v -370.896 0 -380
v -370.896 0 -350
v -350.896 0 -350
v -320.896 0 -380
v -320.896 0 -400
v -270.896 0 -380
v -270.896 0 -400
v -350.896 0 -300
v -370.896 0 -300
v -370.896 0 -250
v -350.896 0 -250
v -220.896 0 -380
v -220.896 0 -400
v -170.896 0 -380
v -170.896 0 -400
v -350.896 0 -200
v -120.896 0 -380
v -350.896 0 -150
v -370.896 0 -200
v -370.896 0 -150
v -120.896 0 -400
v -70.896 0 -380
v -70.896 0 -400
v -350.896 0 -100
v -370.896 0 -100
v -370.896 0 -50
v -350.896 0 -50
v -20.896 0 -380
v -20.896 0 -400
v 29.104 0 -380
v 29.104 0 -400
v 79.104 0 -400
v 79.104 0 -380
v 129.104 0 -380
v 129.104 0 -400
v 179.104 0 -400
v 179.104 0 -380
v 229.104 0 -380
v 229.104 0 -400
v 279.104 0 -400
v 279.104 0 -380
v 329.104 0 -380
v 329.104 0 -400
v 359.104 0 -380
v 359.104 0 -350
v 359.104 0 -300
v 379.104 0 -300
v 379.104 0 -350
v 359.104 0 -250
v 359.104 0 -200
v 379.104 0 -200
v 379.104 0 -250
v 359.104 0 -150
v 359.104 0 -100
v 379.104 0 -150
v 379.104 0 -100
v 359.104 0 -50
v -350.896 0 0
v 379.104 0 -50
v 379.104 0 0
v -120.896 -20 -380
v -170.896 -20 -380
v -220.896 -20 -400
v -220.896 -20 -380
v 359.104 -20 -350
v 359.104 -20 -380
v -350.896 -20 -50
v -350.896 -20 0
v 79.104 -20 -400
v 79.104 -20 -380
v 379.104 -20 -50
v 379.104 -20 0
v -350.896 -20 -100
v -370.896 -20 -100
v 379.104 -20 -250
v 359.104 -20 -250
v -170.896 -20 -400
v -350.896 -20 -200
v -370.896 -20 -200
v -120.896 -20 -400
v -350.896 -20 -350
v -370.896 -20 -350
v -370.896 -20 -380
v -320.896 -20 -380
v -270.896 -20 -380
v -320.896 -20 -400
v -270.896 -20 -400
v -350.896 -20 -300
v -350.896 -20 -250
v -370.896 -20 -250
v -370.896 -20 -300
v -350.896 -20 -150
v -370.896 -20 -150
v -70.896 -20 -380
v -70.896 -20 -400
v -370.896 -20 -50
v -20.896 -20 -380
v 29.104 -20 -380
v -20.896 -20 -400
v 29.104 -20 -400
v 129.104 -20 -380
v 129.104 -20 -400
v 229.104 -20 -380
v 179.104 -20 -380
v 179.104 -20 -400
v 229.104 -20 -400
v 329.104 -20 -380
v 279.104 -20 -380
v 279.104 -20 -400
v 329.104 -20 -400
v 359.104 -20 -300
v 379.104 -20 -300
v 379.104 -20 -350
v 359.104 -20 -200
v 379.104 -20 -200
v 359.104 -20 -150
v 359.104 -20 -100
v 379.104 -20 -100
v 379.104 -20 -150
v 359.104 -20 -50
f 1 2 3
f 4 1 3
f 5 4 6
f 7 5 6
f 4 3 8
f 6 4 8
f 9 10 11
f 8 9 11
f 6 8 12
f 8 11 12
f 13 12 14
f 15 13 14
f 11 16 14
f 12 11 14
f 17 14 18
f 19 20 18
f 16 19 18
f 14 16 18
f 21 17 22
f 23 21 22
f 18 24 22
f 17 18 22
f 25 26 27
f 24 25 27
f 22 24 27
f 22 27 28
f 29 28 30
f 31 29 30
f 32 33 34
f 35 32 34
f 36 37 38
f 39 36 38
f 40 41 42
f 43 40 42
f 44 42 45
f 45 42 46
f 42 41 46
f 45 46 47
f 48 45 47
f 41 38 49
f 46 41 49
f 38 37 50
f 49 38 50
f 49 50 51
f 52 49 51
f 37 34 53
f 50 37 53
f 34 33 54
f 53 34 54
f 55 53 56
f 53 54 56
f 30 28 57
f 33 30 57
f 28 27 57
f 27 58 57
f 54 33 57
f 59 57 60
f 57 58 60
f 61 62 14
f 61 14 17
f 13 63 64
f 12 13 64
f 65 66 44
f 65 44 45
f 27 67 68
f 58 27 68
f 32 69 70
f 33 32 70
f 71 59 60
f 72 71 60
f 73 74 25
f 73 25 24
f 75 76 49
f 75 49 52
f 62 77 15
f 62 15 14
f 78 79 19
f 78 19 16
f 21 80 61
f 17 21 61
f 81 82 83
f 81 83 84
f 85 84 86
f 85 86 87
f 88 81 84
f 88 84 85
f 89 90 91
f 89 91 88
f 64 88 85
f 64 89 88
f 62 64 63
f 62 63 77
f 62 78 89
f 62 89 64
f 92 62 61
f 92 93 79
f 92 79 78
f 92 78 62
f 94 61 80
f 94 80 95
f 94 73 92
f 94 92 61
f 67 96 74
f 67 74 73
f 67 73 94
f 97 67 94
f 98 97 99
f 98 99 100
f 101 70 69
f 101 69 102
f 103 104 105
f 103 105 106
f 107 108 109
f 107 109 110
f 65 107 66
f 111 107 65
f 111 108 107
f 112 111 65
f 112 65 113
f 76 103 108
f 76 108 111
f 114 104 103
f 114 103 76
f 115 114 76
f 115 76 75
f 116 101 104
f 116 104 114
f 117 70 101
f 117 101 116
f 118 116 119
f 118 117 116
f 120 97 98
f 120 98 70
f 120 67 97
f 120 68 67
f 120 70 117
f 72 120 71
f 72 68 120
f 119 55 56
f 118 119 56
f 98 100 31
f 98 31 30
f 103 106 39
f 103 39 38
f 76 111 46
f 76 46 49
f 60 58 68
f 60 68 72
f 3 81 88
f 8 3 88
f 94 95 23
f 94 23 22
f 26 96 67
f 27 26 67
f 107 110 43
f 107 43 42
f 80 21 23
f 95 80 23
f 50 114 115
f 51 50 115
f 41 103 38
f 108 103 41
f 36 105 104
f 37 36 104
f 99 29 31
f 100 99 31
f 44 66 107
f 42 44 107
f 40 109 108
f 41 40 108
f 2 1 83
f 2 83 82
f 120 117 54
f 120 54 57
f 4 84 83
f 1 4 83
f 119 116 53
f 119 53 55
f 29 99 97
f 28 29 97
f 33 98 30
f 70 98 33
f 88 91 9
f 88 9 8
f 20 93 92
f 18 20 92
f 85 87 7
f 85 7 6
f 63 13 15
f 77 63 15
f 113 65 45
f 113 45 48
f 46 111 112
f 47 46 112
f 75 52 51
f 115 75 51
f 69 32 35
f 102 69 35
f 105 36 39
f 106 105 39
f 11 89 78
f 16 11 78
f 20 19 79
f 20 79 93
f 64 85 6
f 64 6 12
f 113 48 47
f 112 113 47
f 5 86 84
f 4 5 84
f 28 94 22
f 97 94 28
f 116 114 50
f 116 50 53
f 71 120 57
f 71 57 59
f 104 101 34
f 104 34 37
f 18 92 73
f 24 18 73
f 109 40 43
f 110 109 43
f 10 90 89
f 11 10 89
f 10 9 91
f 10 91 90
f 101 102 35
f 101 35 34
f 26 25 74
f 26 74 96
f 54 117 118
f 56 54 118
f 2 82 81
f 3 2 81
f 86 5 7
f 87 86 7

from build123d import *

# Parameters (mm, degrees)
F0_W     = 750
F0_H     = 400
F1_DEPTH = 20
F2_W     = 20
F2_H     = 50
F2_H_2   = 30
F3_DEPTH = 20
F2_H_3   = 20
F2_W_2   = 30
F2_W_3   = 50
F4_DEPTH = 20


with BuildPart() as f1:
    # F0 (on Front) → F1 (new body)
    with BuildSketch(Plane.XZ):
        with Locations((4.104346, -200)):
            Rectangle(F0_W, F0_H)
    extrude(amount=F1_DEPTH)

    # F2 (on face) → F3 (cut)
    with BuildSketch(Plane.XZ.offset(20)):
        with Locations((-360.895654, -25)):
            Rectangle(F2_W, F2_H)
        with Locations((-360.895654, -125)):
            Rectangle(F2_W, F2_H)
        with Locations((-360.895654, -225)):
            Rectangle(F2_W, F2_H)
        with Locations((-360.895654, -325)):
            Rectangle(F2_W, F2_H)
        with Locations((369.104346, -365)):
            Rectangle(F2_W, F2_H_2)
        with Locations((369.104346, -275)):
            Rectangle(F2_W, F2_H)
        with Locations((369.104346, -175)):
            Rectangle(F2_W, F2_H)
        with Locations((369.104346, -75)):
            Rectangle(F2_W, F2_H)
    extrude(amount=-F3_DEPTH, mode=Mode.SUBTRACT)

    # F2 (on face) → F4 (cut)
    with BuildSketch(Plane.XZ.offset(20)):
        with Locations((-360.895654, -390)):
            Rectangle(F2_W, F2_H_3)
        with Locations((-335.895654, -390)):
            Rectangle(F2_W_2, F2_H_3)
        with Locations((-245.895654, -390)):
            Rectangle(F2_W_3, F2_H_3)
        with Locations((-145.895654, -390)):
            Rectangle(F2_W_3, F2_H_3)
        with Locations((-45.895654, -390)):
            Rectangle(F2_W_3, F2_H_3)
        with Locations((54.104346, -390)):
            Rectangle(F2_W_3, F2_H_3)
        with Locations((154.104346, -390)):
            Rectangle(F2_W_3, F2_H_3)
        with Locations((254.104346, -390)):
            Rectangle(F2_W_3, F2_H_3)
        with Locations((344.104346, -390)):
            Rectangle(F2_W_2, F2_H_3)
        with Locations((369.104346, -390)):
            Rectangle(F2_W, F2_H_3)
    extrude(amount=-F4_DEPTH, mode=Mode.SUBTRACT)


solid = f1.part
